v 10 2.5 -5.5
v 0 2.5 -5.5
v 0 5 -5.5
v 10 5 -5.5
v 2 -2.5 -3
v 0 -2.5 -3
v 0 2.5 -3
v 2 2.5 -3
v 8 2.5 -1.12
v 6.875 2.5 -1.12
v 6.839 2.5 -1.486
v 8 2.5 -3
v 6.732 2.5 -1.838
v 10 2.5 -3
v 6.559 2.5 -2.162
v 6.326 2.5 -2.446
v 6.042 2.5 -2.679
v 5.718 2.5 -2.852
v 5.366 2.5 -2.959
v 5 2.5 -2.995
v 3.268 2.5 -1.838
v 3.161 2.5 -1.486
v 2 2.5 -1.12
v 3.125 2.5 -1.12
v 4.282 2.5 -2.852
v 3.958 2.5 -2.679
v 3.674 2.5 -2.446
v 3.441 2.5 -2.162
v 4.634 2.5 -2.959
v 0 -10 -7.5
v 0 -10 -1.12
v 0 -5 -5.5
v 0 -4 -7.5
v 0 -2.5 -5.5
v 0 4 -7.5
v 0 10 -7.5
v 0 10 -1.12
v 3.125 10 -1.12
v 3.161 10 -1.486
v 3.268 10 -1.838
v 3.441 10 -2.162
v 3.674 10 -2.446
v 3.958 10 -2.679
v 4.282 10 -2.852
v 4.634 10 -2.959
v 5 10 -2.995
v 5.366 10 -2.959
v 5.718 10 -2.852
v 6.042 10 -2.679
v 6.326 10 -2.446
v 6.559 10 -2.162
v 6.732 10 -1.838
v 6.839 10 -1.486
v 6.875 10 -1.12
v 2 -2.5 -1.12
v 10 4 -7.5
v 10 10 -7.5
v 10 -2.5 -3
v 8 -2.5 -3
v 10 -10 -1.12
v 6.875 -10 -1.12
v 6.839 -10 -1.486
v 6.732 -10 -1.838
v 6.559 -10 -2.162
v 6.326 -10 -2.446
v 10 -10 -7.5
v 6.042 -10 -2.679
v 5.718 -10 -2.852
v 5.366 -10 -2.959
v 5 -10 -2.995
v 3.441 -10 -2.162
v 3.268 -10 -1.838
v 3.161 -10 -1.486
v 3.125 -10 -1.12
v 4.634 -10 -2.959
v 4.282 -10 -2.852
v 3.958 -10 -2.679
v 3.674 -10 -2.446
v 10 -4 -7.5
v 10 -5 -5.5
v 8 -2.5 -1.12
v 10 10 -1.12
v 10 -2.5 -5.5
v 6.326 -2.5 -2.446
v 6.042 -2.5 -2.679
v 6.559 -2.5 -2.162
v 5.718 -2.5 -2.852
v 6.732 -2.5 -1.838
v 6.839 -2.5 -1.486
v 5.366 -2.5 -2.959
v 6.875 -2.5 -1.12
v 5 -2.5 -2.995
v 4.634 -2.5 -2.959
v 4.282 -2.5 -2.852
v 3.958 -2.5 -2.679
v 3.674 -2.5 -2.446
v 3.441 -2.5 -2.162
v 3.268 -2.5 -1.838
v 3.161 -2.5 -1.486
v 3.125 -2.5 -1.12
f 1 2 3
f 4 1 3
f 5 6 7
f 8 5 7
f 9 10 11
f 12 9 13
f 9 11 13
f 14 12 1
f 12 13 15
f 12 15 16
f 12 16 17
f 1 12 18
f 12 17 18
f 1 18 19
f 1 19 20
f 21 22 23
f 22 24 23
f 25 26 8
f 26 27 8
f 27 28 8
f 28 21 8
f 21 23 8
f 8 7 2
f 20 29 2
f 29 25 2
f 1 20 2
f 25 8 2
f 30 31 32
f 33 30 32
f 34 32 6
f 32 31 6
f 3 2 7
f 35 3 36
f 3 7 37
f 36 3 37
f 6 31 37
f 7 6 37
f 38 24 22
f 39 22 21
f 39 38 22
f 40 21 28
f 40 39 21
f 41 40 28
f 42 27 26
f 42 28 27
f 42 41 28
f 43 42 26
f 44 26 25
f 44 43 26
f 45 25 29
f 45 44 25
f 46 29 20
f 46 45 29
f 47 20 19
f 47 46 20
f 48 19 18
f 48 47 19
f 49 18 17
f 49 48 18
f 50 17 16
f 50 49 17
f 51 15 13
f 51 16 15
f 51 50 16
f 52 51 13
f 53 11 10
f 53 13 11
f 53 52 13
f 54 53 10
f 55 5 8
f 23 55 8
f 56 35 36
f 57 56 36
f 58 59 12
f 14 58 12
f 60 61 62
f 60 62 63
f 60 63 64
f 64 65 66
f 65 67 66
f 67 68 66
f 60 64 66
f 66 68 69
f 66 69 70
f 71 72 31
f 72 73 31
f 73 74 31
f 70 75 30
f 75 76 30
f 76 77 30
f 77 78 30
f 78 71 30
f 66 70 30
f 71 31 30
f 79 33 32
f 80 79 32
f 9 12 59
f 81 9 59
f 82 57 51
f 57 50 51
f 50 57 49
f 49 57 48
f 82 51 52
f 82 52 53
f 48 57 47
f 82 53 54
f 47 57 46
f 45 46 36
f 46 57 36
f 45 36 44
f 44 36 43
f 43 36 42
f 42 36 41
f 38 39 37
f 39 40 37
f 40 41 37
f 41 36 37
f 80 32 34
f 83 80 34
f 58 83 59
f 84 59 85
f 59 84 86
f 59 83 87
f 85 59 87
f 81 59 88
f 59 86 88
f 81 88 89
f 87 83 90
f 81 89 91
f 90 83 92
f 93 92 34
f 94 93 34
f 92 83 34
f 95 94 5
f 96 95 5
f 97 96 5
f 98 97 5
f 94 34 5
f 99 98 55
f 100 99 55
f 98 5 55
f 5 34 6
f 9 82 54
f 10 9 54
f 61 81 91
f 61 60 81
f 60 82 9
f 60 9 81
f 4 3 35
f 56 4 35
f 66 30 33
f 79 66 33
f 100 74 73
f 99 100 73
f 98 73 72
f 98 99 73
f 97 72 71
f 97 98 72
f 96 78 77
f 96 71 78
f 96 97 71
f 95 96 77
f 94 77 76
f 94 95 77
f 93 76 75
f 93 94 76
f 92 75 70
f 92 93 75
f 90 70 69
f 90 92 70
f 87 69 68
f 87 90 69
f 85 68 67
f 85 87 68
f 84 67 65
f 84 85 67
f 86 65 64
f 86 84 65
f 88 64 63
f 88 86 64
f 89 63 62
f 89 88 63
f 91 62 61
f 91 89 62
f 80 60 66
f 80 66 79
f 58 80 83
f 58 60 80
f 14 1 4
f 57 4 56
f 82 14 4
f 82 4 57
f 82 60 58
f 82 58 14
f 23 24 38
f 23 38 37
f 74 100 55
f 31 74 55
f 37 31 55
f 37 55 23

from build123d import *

# Parameters (mm, degrees)
BOSS_EXTRUDE1_DEPTH     = 10
CUT_EXTRUDE2_DEPTH      = 4.88
CUT_EXTRUDE4_DEPTH      = 18.67766953
CUT_EXTRUDE4_DEPTH_BACK = 18.67766953
SKETCH6_3_R             = 1.875
CUT_EXTRUDE5_DEPTH      = 24.58495283
CUT_EXTRUDE5_DEPTH_BACK = 24.58495283
SKETCH7_OUTSIDE_W       = 17.386
SKETCH7_OUTSIDE_H       = 22.386
SKETCH7_OUTSIDE_W_2     = 10
SKETCH7_OUTSIDE_H_2     = 6.38


with BuildPart() as part:
    # Sketch2 → Boss-Extrude1 (new body)
    with BuildSketch(Plane.YZ):
        Polygon((-10, -7.5), (-4, -7.5), (-5, -5.5), (-2.5, -5.5), (-2.5, -3), (2.5, -3), (2.5, -5.5), (5, -5.5), (4, -7.5), (10, -7.5), (10, 7.5), (-10, 7.5), align=None)
    extrude(amount=BOSS_EXTRUDE1_DEPTH)

    # Sketch4 → Cut-Extrude2 (cut)
    with BuildSketch(Plane(origin=(0, 0, -3), x_dir=(1, 0, 0), z_dir=(0, 0, -1))):
        Polygon((5, 2.5), (2, 2.5), (2, -2.5), (8, -2.5), (8, 2.5), align=None)
    extrude(amount=-CUT_EXTRUDE2_DEPTH, mode=Mode.SUBTRACT)

    # Sketch6<3> → Cut-Extrude4 (cut, two sides: drawn at the far end of the back side and taken through both)
    with BuildSketch(Plane.XZ.offset(-2.5).offset(-CUT_EXTRUDE4_DEPTH_BACK)):
        with Locations((5, -1.12)):
            Circle(SKETCH6_3_R)
    extrude(amount=CUT_EXTRUDE4_DEPTH + CUT_EXTRUDE4_DEPTH_BACK, mode=Mode.SUBTRACT)

    # Sketch7 outside → Cut-Extrude5 (cut, two sides: drawn at the far end of the back side and taken through both)
    with BuildSketch(Plane(origin=(0, 10, 0), x_dir=(-1, 0, 0), z_dir=(0, 1, 0)).offset(-CUT_EXTRUDE5_DEPTH_BACK)):
        with Locations((-5, 0)):
            Rectangle(SKETCH7_OUTSIDE_W, SKETCH7_OUTSIDE_H)
        with Locations((-5, -4.31)):
            Rectangle(SKETCH7_OUTSIDE_W_2, SKETCH7_OUTSIDE_H_2, mode=Mode.SUBTRACT)
    extrude(amount=CUT_EXTRUDE5_DEPTH + CUT_EXTRUDE5_DEPTH_BACK, mode=Mode.SUBTRACT)


solid = part.part
